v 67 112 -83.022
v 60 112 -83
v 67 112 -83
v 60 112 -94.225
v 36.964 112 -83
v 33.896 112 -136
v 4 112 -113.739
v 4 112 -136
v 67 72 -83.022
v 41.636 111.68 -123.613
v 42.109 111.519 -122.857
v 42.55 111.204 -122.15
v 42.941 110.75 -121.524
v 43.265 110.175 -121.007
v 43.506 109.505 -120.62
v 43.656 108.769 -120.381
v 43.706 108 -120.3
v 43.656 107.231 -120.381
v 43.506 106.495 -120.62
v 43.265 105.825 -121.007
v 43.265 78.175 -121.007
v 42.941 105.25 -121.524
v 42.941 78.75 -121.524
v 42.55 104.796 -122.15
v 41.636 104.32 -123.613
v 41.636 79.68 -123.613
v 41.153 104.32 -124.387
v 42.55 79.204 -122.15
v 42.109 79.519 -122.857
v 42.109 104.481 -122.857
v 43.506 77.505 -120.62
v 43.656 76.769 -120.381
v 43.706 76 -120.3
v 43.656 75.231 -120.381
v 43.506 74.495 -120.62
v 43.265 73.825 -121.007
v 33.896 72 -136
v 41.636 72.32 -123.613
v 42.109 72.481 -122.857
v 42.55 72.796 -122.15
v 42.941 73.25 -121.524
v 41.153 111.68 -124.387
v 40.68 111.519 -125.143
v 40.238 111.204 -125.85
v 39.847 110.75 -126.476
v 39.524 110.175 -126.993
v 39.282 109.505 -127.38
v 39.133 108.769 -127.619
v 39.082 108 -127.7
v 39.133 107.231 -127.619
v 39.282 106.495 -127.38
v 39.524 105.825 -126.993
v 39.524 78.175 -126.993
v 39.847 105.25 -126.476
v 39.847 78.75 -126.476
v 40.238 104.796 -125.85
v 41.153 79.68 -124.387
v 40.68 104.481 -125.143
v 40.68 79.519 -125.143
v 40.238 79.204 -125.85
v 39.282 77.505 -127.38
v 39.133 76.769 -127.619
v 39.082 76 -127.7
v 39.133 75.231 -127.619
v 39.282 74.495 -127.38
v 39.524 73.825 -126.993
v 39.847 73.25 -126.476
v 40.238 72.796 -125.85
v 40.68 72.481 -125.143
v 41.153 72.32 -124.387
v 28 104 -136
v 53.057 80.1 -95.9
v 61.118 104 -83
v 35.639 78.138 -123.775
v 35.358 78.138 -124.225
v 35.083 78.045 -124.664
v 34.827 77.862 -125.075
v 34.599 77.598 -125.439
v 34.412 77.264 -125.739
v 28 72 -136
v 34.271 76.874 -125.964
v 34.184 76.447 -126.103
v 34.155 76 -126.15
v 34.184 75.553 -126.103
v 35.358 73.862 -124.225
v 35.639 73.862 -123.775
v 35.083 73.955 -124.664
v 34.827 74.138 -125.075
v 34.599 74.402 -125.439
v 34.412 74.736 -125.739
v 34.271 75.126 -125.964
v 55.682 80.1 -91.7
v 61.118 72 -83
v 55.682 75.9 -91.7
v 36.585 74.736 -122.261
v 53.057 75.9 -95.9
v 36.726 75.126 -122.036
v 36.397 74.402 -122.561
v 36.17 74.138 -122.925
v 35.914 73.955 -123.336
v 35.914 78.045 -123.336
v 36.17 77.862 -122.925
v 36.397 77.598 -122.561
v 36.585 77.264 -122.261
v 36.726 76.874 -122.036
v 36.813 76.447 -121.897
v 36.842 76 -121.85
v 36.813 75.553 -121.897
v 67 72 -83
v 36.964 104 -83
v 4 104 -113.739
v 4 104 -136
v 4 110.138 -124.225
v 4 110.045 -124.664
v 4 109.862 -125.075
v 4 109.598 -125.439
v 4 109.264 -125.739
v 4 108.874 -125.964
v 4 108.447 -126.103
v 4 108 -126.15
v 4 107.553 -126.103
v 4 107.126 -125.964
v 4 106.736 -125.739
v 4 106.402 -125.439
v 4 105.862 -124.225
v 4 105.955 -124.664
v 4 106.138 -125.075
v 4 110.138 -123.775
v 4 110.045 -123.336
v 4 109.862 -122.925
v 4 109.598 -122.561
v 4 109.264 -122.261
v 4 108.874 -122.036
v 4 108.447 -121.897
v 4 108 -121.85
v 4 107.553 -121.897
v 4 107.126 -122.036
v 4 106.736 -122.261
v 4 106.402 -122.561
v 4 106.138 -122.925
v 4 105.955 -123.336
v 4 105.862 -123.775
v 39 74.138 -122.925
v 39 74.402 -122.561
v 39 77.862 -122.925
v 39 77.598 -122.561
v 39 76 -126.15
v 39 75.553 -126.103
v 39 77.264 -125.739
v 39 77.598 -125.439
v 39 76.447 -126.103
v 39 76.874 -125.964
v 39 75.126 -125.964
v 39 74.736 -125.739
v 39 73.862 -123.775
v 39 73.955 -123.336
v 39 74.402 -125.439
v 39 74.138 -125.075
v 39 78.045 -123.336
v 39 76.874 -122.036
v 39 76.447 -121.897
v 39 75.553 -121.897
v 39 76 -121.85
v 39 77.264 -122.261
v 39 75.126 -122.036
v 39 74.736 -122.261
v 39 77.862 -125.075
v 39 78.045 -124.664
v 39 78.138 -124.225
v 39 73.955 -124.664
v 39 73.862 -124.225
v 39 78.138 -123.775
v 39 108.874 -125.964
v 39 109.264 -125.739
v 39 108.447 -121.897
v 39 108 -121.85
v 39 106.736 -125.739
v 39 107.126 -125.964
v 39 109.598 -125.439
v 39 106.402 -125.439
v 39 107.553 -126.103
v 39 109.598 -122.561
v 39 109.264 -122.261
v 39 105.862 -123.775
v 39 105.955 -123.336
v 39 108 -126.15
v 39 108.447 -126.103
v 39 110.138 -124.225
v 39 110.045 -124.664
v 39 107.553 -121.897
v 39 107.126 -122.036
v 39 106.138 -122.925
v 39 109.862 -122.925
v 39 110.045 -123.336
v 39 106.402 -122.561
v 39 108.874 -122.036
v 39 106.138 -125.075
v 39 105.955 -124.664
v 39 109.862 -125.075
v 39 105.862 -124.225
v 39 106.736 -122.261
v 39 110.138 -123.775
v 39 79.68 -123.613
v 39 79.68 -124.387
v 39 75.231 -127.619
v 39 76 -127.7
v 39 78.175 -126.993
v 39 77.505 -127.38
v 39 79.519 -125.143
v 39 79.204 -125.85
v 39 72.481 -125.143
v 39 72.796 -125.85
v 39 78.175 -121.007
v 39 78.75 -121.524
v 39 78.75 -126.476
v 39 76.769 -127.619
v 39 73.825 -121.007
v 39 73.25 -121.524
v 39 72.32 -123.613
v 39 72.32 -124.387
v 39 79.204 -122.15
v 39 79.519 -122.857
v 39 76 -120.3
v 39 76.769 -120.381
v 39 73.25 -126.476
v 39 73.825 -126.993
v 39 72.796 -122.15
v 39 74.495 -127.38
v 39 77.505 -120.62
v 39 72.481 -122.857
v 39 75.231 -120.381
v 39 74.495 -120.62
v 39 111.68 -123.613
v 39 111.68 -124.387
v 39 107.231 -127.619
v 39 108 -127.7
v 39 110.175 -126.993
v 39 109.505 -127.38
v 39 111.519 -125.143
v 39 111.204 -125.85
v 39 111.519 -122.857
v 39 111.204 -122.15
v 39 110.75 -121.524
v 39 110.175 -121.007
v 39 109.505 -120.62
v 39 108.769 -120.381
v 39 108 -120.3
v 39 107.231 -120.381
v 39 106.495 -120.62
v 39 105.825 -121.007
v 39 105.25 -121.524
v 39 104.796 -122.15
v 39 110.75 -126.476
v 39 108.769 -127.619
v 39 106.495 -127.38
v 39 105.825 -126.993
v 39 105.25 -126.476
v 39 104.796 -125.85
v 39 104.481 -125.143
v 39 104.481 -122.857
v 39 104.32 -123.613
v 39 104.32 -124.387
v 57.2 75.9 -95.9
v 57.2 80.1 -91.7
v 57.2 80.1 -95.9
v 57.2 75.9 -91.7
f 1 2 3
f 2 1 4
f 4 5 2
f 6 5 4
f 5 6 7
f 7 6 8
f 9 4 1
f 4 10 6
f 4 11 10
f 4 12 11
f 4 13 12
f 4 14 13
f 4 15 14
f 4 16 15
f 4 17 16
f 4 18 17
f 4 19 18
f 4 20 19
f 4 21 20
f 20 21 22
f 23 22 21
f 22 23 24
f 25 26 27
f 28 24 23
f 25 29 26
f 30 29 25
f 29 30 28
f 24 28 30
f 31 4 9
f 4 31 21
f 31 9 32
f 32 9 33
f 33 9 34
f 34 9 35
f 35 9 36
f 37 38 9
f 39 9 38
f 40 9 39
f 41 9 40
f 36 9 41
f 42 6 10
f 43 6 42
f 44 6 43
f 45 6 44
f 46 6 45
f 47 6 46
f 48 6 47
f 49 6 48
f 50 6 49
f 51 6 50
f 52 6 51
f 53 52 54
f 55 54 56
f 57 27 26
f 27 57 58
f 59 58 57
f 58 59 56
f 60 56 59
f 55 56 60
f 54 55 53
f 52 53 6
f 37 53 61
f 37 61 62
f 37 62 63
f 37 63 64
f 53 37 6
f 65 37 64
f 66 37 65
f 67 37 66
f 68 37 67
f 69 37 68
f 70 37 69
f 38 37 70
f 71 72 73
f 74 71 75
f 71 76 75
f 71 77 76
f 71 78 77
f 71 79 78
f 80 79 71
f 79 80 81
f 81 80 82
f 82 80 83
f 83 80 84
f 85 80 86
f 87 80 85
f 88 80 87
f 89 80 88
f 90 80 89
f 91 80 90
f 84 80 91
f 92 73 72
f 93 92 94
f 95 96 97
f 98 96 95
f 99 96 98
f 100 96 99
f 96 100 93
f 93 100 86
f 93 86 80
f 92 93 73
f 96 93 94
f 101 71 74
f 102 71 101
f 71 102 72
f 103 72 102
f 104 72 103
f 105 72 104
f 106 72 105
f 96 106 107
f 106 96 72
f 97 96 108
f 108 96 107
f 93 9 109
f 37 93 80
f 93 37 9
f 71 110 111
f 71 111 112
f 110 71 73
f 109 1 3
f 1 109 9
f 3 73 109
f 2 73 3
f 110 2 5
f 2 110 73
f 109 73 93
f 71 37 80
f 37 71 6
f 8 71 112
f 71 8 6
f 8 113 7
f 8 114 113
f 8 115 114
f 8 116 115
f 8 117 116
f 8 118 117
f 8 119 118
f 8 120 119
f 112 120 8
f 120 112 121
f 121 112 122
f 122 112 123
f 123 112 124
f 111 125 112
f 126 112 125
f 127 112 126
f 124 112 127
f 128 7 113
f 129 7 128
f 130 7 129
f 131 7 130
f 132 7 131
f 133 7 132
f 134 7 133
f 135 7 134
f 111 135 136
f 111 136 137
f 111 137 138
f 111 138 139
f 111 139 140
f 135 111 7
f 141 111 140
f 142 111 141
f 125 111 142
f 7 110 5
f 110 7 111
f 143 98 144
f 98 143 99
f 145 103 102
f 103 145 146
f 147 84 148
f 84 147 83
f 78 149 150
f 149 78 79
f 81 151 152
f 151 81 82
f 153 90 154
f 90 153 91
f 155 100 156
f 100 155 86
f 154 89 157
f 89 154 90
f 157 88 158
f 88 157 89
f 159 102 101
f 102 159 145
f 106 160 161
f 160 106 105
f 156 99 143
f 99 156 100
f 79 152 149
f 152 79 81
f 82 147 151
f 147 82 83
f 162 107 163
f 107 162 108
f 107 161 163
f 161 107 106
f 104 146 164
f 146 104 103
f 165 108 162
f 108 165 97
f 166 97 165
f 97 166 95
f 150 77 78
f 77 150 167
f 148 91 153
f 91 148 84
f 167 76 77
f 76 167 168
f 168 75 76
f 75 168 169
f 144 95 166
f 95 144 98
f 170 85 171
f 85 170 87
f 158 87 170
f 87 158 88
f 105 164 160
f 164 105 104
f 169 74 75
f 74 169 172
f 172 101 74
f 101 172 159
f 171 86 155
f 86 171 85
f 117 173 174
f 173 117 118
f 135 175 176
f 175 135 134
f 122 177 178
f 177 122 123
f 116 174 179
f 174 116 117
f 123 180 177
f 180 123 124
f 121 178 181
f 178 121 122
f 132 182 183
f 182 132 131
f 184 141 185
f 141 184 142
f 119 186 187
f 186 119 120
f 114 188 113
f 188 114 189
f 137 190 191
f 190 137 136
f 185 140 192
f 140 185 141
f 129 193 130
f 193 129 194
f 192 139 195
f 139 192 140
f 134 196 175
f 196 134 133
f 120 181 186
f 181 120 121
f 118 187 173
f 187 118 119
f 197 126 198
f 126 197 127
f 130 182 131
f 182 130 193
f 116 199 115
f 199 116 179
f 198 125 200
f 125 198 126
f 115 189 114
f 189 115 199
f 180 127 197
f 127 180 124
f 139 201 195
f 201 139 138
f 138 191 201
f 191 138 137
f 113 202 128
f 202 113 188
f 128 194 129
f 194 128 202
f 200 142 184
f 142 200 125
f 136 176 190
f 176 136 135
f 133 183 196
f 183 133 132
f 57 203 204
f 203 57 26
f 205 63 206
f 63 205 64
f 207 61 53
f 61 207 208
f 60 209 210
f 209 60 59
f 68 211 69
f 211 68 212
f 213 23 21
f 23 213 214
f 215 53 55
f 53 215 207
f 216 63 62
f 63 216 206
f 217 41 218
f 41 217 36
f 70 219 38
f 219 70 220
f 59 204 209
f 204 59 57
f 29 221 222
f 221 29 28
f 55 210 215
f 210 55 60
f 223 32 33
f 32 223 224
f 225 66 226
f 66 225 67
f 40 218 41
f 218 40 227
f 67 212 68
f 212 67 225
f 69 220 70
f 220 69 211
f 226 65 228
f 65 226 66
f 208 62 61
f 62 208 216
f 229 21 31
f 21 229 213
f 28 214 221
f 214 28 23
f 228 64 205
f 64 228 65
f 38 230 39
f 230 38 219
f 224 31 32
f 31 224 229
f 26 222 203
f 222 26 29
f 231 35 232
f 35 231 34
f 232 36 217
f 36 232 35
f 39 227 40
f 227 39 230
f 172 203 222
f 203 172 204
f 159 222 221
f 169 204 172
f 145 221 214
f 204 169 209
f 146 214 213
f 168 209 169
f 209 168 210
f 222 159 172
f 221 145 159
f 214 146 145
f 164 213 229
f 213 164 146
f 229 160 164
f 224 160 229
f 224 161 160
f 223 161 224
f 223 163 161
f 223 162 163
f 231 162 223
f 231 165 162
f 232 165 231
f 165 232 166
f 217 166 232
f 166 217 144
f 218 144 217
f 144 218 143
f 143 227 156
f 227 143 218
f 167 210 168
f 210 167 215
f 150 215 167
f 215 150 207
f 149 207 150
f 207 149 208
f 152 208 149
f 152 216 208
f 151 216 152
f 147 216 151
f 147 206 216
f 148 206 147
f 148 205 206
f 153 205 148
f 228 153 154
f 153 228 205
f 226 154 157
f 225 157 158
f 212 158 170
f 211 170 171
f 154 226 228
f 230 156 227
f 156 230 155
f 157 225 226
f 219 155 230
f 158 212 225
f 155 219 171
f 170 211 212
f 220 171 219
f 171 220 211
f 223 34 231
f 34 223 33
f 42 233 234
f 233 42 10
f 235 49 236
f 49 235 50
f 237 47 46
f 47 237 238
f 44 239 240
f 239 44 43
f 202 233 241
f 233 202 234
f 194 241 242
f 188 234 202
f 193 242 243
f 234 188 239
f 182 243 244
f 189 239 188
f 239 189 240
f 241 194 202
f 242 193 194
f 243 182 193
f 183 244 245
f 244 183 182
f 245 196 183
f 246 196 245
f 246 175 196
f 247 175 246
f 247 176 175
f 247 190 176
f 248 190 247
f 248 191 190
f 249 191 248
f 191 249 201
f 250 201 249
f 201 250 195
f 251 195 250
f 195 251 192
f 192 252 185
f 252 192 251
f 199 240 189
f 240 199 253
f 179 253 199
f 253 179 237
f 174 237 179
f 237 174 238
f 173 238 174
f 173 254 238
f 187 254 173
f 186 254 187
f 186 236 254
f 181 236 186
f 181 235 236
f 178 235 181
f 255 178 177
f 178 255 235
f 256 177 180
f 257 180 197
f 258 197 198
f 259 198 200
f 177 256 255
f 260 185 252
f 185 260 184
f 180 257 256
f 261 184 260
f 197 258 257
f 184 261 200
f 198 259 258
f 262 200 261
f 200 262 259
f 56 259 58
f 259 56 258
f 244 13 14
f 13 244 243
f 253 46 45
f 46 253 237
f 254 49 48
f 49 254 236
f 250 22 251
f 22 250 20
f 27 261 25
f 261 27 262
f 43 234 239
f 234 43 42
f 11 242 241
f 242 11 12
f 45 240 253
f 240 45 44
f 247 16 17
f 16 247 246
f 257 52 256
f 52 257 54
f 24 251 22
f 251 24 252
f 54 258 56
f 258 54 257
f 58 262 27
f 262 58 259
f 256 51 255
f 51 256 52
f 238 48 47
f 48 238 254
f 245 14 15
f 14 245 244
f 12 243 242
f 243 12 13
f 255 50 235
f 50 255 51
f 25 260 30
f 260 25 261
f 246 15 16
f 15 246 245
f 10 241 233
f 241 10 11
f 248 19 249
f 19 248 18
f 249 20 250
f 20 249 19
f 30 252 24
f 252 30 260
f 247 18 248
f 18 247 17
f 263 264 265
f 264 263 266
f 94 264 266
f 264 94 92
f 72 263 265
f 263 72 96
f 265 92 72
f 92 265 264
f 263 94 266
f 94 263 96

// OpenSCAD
// first part of bottom guard rail
difference() {
union() {
    // front plate at an angle
    translate([28,72,-136])
    rotate([0,32,0])
    cube([5,40,80]);
    
    // right top wall
    translate([-10,104,-135])
    rotate([0,32,0])
    cube([35,8,85]);
}
    // front clean up
    translate([67,60,-90])
    cube([30,60,30]);

    // top clean up
    translate([10,60,-83])
    cube([65,60,30]);

    // bottom clean up
    translate([0,60,-160])
    cube([40,60,24]);
    
    // right clean up
    translate([0,112,-160])
    cube([60,10,100]);
    
    // clean up on bracket side
    // bottom
    translate([-30,60,-150])
    cube([34,60,50]);
    
    // top at an angle
    translate([-40,71,-112])
    rotate([0,47,0])
    cube([31.28,42,87]);
    
    // bottom holes left and right
    translate([-4,76,-124])
    rotate([0,90,0])
    cylinder(r=2.15,60, $fn=30);

    translate([-4,108,-124])
    rotate([0,90,0])
    cylinder(r=2.15,60, $fn=30);

    // spot for screw at the end of the holes
    translate([39,76,-124])
    rotate([0,90,0])
    cylinder(r=3.7,5, $fn=30);
    
    translate([39,108,-124])
    rotate([0,90,0])
    cylinder(r=3.7,5, $fn=30);
    
    // cubed hole to secure left piece
    translate([52,75.9,-95.9])
    cube([5.2,4.2,4.2]);
}
